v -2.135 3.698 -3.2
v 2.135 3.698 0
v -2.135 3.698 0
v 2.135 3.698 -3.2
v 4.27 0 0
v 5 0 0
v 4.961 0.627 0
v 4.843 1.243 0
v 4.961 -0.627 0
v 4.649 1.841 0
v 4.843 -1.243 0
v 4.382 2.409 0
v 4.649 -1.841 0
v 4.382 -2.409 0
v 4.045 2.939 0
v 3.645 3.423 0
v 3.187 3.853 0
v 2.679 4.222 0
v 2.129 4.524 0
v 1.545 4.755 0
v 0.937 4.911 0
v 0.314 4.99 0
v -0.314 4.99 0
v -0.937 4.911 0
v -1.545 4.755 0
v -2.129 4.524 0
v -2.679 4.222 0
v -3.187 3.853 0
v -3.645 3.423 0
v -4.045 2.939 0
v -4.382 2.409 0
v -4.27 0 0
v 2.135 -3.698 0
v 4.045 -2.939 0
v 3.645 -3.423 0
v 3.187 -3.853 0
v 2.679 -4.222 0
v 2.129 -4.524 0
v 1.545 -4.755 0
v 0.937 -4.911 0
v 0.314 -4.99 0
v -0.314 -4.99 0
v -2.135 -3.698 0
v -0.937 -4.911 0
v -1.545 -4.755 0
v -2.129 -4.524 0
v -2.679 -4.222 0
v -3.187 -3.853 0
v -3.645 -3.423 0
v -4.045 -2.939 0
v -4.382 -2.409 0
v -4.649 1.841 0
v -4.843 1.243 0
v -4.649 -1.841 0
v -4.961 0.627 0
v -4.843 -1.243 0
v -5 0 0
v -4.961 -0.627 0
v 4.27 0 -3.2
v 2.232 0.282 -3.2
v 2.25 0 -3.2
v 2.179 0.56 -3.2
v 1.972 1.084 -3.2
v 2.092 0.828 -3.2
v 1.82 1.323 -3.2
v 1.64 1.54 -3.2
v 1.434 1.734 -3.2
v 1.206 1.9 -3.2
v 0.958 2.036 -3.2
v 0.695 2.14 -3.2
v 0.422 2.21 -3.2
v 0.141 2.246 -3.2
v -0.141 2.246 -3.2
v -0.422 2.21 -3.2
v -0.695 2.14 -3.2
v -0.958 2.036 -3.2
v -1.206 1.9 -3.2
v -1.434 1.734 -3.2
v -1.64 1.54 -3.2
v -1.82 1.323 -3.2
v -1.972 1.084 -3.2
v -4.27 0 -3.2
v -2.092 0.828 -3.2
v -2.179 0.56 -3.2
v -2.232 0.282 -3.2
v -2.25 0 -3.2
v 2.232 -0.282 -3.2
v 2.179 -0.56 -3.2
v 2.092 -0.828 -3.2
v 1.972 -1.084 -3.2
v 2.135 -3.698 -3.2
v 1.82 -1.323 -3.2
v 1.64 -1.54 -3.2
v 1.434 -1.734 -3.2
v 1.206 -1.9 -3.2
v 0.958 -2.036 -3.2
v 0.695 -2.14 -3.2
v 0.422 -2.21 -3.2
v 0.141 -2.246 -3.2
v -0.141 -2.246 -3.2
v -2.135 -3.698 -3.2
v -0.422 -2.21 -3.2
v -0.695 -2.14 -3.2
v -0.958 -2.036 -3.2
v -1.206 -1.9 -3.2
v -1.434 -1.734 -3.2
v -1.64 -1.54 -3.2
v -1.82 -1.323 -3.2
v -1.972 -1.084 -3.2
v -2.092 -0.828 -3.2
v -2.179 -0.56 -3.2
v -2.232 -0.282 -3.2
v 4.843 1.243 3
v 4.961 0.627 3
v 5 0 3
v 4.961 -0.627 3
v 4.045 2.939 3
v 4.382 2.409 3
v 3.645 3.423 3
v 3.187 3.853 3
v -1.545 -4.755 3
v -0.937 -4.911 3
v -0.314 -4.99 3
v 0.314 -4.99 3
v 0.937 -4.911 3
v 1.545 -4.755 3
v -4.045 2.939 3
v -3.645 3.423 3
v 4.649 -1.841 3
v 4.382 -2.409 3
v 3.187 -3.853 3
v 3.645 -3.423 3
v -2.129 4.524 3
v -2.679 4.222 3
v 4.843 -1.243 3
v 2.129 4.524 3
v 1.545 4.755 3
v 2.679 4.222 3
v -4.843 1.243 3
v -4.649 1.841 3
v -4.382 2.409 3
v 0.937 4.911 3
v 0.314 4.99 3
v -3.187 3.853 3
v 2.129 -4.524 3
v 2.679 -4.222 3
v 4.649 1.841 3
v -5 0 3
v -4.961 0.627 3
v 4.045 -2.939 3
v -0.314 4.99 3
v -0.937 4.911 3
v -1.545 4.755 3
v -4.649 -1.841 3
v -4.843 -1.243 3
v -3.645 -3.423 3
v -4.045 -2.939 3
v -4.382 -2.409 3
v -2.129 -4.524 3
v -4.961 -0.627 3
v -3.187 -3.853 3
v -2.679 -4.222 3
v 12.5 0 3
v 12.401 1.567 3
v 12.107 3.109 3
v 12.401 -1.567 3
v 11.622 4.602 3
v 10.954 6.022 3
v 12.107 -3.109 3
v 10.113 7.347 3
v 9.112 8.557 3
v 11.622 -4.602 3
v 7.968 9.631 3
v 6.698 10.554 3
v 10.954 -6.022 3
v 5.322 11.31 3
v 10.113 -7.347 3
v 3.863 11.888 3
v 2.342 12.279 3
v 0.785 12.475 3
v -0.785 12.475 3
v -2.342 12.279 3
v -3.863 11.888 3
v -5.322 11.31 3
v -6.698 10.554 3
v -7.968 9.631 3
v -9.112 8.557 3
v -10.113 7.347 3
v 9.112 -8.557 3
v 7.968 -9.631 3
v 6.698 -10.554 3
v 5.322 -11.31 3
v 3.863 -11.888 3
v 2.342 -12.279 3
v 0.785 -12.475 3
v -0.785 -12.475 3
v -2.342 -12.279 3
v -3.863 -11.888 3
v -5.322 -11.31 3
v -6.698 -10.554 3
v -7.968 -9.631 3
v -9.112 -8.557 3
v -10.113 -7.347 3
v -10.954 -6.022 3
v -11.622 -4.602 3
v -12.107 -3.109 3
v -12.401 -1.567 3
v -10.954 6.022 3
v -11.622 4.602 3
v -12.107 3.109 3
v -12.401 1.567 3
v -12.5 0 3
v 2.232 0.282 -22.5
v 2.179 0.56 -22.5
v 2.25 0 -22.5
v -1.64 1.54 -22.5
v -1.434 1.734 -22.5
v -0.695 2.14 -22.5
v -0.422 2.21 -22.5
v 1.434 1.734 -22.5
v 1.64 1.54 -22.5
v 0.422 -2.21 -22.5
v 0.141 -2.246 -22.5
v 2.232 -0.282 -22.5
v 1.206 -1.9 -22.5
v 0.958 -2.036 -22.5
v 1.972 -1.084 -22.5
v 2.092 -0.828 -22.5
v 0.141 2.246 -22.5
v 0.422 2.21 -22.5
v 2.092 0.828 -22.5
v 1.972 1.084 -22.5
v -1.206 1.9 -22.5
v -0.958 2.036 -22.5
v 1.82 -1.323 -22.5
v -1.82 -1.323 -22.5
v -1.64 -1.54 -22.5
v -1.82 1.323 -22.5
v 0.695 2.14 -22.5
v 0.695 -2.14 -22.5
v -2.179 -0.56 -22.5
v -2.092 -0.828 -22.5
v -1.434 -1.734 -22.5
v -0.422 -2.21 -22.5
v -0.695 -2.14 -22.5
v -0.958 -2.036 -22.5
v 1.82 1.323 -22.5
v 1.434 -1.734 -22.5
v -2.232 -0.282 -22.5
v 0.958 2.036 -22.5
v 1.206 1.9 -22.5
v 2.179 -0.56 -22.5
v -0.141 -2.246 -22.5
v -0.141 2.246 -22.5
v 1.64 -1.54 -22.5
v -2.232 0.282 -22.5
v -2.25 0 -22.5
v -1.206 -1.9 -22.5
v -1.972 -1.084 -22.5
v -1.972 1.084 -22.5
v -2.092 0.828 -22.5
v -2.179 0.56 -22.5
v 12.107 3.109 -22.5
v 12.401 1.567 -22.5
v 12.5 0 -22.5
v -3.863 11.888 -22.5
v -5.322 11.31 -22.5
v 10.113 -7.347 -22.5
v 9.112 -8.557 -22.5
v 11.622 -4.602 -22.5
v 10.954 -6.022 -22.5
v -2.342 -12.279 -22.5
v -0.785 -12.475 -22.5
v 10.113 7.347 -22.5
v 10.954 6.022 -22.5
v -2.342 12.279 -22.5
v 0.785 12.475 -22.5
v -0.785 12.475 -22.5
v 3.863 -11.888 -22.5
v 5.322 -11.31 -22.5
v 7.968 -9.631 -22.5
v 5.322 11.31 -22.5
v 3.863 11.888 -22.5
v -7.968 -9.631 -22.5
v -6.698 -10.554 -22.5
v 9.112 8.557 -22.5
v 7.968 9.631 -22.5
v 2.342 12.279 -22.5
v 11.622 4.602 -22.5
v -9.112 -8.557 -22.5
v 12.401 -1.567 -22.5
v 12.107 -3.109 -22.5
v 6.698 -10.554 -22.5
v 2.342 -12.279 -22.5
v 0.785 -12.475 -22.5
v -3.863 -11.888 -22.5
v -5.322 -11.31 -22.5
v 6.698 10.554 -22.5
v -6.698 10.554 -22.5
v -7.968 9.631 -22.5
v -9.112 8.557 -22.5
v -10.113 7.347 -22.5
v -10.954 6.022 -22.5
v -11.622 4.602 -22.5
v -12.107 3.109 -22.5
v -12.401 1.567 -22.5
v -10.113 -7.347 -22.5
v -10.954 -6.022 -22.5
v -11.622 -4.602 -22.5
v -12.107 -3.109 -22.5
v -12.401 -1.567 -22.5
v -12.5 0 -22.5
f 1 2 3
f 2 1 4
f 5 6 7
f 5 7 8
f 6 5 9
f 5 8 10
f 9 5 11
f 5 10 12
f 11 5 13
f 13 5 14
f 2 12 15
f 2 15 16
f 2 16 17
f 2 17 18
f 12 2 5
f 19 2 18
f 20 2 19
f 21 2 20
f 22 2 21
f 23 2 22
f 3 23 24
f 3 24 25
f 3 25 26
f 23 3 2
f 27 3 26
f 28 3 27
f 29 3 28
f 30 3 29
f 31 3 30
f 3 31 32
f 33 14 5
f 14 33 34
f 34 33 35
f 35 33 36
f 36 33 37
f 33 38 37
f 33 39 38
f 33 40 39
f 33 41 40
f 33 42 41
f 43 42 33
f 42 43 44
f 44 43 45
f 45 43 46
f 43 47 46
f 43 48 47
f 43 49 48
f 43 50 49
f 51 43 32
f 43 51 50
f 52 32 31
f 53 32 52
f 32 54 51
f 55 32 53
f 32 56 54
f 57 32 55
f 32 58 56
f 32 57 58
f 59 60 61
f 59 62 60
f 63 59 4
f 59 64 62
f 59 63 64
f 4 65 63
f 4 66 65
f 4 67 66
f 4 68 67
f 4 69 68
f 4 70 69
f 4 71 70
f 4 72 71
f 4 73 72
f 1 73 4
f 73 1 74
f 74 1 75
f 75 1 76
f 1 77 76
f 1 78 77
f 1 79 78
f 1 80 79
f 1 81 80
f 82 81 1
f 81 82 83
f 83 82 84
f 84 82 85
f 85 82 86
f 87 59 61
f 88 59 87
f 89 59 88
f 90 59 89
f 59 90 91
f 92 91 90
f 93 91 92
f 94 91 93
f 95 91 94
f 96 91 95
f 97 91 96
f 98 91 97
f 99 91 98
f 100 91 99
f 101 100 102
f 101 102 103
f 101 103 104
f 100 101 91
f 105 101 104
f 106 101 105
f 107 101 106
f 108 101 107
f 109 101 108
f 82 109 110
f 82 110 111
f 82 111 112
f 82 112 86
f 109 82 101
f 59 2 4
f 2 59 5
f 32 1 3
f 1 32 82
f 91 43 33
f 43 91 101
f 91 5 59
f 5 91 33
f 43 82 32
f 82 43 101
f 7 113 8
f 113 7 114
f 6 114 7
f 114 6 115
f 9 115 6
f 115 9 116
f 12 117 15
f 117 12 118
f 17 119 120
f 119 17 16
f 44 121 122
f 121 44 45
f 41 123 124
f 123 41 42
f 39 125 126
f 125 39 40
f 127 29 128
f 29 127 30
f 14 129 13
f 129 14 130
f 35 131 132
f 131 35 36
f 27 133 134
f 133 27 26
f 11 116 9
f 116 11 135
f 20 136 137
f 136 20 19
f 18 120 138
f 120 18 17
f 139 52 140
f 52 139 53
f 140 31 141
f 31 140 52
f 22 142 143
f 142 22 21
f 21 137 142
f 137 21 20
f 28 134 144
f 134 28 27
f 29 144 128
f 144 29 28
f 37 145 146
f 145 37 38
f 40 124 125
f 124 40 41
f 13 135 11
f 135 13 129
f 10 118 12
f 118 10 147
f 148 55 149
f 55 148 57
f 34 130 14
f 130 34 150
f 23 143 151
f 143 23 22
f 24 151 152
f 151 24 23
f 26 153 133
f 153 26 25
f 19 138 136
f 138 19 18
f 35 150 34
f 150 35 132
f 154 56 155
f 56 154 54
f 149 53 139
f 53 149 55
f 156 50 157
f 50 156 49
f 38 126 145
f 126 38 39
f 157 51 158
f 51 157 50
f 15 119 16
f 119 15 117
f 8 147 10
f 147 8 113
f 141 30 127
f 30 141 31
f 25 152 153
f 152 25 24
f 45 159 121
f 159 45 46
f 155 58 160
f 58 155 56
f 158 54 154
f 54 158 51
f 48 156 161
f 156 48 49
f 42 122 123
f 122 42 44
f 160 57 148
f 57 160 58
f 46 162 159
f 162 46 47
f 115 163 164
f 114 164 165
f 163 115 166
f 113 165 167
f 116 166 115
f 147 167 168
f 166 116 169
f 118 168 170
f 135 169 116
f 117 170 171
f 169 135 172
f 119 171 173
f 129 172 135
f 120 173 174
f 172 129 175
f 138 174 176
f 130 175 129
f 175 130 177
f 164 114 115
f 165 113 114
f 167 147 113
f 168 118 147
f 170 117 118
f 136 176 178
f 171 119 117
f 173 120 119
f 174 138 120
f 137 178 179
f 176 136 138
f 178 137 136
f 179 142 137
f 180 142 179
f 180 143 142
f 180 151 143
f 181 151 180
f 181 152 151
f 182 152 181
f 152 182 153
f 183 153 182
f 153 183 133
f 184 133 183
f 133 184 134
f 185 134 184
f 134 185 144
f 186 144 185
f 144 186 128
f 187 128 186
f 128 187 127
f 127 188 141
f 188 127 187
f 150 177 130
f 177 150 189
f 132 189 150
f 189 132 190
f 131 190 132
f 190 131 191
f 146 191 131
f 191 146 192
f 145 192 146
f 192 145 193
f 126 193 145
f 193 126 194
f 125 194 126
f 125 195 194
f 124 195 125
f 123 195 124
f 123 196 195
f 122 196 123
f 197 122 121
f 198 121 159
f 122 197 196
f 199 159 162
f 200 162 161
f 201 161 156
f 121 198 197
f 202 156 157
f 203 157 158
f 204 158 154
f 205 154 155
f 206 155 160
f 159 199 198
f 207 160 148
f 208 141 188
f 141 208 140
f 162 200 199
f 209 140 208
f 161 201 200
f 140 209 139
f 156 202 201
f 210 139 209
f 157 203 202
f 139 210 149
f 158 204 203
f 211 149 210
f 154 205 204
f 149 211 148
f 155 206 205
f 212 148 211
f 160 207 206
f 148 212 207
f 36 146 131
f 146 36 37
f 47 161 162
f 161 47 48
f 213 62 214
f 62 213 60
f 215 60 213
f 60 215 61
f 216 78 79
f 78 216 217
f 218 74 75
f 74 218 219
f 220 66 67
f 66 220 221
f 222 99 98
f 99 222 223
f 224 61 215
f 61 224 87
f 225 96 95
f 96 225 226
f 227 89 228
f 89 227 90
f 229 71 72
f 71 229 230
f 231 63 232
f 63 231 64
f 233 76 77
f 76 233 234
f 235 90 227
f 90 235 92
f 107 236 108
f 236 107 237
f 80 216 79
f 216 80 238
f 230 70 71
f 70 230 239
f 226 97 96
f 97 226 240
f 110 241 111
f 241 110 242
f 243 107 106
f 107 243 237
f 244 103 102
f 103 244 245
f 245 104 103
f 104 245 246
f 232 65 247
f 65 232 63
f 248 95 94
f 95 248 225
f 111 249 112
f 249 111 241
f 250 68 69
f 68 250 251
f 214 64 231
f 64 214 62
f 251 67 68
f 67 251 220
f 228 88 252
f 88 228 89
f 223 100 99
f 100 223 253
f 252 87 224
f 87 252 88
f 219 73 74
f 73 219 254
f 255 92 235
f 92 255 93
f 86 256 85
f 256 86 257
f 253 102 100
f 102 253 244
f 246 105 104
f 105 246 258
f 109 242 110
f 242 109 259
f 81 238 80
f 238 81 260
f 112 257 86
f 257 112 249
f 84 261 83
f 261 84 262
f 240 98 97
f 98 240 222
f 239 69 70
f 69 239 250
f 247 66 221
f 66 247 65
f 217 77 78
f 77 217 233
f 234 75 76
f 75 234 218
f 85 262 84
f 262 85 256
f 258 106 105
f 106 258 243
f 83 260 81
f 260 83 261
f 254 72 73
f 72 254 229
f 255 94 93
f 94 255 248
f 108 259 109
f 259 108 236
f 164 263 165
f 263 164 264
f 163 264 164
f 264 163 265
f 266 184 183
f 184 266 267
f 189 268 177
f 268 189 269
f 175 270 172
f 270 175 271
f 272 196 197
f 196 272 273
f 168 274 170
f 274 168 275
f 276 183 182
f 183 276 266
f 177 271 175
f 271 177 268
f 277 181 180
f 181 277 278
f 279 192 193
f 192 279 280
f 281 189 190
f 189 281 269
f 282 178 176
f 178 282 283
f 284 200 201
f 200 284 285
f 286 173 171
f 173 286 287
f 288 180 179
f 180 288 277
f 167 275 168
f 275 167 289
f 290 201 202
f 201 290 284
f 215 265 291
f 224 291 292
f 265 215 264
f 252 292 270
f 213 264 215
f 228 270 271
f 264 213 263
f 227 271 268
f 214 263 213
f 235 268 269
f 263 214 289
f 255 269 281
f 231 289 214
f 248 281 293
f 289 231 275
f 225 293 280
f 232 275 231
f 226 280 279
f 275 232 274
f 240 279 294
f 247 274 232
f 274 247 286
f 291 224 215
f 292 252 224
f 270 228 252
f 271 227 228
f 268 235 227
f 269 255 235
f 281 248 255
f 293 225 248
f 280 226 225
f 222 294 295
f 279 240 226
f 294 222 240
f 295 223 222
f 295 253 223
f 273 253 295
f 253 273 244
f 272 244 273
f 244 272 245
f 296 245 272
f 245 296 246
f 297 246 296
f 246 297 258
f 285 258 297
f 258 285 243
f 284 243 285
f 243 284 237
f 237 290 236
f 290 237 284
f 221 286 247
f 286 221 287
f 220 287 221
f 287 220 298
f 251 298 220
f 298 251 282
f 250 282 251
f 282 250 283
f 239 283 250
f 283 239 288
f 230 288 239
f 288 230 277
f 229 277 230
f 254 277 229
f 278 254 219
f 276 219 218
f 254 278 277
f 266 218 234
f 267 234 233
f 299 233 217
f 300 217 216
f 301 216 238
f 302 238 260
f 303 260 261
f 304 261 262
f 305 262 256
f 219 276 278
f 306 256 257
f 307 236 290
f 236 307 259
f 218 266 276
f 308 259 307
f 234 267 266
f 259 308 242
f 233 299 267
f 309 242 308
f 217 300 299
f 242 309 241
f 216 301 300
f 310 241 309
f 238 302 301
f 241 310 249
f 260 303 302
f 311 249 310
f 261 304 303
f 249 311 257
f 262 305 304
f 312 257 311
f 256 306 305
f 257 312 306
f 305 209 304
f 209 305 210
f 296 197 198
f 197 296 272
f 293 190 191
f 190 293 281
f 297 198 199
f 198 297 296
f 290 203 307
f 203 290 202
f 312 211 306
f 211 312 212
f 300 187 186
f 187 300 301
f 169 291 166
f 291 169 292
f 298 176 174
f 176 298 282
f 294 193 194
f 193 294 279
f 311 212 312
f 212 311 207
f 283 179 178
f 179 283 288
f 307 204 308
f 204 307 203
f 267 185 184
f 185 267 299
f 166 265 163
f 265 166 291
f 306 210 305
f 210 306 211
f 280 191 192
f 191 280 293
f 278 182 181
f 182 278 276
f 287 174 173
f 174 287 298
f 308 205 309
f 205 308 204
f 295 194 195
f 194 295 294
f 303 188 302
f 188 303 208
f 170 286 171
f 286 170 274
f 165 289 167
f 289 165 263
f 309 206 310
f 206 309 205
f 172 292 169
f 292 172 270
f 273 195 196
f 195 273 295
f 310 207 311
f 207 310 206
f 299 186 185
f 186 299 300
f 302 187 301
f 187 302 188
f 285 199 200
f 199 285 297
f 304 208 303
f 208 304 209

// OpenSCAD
$fn = 50;


difference() {
	union() {
		translate(v = [0, 0, -22.5000000000]) {
			cylinder(h = 25.5000000000, r = 12.5000000000);
		}
	}
	union() {
		translate(v = [0, 0, 0]) {
			rotate(a = [0, 0, 0]) {
				difference() {
					union() {
						translate(v = [0, 0, -3.2000000000]) {
							linear_extrude(height = 3.2000000000) {
								polygon(points = [[4.2698000000, 0.0000000000], [2.1349000000, 3.6977552691], [-2.1349000000, 3.6977552691], [-4.2698000000, 0.0000000000], [-2.1349000000, -3.6977552691], [2.1349000000, -3.6977552691]]);
							}
						}
					}
					union();
				}
			}
		}
		#cylinder(h = 3, r = 5.0000000000);
		#translate(v = [0, 0, -100.0000000000]) {
			cylinder(h = 200, r = 2.2500000000);
		}
	}
}
